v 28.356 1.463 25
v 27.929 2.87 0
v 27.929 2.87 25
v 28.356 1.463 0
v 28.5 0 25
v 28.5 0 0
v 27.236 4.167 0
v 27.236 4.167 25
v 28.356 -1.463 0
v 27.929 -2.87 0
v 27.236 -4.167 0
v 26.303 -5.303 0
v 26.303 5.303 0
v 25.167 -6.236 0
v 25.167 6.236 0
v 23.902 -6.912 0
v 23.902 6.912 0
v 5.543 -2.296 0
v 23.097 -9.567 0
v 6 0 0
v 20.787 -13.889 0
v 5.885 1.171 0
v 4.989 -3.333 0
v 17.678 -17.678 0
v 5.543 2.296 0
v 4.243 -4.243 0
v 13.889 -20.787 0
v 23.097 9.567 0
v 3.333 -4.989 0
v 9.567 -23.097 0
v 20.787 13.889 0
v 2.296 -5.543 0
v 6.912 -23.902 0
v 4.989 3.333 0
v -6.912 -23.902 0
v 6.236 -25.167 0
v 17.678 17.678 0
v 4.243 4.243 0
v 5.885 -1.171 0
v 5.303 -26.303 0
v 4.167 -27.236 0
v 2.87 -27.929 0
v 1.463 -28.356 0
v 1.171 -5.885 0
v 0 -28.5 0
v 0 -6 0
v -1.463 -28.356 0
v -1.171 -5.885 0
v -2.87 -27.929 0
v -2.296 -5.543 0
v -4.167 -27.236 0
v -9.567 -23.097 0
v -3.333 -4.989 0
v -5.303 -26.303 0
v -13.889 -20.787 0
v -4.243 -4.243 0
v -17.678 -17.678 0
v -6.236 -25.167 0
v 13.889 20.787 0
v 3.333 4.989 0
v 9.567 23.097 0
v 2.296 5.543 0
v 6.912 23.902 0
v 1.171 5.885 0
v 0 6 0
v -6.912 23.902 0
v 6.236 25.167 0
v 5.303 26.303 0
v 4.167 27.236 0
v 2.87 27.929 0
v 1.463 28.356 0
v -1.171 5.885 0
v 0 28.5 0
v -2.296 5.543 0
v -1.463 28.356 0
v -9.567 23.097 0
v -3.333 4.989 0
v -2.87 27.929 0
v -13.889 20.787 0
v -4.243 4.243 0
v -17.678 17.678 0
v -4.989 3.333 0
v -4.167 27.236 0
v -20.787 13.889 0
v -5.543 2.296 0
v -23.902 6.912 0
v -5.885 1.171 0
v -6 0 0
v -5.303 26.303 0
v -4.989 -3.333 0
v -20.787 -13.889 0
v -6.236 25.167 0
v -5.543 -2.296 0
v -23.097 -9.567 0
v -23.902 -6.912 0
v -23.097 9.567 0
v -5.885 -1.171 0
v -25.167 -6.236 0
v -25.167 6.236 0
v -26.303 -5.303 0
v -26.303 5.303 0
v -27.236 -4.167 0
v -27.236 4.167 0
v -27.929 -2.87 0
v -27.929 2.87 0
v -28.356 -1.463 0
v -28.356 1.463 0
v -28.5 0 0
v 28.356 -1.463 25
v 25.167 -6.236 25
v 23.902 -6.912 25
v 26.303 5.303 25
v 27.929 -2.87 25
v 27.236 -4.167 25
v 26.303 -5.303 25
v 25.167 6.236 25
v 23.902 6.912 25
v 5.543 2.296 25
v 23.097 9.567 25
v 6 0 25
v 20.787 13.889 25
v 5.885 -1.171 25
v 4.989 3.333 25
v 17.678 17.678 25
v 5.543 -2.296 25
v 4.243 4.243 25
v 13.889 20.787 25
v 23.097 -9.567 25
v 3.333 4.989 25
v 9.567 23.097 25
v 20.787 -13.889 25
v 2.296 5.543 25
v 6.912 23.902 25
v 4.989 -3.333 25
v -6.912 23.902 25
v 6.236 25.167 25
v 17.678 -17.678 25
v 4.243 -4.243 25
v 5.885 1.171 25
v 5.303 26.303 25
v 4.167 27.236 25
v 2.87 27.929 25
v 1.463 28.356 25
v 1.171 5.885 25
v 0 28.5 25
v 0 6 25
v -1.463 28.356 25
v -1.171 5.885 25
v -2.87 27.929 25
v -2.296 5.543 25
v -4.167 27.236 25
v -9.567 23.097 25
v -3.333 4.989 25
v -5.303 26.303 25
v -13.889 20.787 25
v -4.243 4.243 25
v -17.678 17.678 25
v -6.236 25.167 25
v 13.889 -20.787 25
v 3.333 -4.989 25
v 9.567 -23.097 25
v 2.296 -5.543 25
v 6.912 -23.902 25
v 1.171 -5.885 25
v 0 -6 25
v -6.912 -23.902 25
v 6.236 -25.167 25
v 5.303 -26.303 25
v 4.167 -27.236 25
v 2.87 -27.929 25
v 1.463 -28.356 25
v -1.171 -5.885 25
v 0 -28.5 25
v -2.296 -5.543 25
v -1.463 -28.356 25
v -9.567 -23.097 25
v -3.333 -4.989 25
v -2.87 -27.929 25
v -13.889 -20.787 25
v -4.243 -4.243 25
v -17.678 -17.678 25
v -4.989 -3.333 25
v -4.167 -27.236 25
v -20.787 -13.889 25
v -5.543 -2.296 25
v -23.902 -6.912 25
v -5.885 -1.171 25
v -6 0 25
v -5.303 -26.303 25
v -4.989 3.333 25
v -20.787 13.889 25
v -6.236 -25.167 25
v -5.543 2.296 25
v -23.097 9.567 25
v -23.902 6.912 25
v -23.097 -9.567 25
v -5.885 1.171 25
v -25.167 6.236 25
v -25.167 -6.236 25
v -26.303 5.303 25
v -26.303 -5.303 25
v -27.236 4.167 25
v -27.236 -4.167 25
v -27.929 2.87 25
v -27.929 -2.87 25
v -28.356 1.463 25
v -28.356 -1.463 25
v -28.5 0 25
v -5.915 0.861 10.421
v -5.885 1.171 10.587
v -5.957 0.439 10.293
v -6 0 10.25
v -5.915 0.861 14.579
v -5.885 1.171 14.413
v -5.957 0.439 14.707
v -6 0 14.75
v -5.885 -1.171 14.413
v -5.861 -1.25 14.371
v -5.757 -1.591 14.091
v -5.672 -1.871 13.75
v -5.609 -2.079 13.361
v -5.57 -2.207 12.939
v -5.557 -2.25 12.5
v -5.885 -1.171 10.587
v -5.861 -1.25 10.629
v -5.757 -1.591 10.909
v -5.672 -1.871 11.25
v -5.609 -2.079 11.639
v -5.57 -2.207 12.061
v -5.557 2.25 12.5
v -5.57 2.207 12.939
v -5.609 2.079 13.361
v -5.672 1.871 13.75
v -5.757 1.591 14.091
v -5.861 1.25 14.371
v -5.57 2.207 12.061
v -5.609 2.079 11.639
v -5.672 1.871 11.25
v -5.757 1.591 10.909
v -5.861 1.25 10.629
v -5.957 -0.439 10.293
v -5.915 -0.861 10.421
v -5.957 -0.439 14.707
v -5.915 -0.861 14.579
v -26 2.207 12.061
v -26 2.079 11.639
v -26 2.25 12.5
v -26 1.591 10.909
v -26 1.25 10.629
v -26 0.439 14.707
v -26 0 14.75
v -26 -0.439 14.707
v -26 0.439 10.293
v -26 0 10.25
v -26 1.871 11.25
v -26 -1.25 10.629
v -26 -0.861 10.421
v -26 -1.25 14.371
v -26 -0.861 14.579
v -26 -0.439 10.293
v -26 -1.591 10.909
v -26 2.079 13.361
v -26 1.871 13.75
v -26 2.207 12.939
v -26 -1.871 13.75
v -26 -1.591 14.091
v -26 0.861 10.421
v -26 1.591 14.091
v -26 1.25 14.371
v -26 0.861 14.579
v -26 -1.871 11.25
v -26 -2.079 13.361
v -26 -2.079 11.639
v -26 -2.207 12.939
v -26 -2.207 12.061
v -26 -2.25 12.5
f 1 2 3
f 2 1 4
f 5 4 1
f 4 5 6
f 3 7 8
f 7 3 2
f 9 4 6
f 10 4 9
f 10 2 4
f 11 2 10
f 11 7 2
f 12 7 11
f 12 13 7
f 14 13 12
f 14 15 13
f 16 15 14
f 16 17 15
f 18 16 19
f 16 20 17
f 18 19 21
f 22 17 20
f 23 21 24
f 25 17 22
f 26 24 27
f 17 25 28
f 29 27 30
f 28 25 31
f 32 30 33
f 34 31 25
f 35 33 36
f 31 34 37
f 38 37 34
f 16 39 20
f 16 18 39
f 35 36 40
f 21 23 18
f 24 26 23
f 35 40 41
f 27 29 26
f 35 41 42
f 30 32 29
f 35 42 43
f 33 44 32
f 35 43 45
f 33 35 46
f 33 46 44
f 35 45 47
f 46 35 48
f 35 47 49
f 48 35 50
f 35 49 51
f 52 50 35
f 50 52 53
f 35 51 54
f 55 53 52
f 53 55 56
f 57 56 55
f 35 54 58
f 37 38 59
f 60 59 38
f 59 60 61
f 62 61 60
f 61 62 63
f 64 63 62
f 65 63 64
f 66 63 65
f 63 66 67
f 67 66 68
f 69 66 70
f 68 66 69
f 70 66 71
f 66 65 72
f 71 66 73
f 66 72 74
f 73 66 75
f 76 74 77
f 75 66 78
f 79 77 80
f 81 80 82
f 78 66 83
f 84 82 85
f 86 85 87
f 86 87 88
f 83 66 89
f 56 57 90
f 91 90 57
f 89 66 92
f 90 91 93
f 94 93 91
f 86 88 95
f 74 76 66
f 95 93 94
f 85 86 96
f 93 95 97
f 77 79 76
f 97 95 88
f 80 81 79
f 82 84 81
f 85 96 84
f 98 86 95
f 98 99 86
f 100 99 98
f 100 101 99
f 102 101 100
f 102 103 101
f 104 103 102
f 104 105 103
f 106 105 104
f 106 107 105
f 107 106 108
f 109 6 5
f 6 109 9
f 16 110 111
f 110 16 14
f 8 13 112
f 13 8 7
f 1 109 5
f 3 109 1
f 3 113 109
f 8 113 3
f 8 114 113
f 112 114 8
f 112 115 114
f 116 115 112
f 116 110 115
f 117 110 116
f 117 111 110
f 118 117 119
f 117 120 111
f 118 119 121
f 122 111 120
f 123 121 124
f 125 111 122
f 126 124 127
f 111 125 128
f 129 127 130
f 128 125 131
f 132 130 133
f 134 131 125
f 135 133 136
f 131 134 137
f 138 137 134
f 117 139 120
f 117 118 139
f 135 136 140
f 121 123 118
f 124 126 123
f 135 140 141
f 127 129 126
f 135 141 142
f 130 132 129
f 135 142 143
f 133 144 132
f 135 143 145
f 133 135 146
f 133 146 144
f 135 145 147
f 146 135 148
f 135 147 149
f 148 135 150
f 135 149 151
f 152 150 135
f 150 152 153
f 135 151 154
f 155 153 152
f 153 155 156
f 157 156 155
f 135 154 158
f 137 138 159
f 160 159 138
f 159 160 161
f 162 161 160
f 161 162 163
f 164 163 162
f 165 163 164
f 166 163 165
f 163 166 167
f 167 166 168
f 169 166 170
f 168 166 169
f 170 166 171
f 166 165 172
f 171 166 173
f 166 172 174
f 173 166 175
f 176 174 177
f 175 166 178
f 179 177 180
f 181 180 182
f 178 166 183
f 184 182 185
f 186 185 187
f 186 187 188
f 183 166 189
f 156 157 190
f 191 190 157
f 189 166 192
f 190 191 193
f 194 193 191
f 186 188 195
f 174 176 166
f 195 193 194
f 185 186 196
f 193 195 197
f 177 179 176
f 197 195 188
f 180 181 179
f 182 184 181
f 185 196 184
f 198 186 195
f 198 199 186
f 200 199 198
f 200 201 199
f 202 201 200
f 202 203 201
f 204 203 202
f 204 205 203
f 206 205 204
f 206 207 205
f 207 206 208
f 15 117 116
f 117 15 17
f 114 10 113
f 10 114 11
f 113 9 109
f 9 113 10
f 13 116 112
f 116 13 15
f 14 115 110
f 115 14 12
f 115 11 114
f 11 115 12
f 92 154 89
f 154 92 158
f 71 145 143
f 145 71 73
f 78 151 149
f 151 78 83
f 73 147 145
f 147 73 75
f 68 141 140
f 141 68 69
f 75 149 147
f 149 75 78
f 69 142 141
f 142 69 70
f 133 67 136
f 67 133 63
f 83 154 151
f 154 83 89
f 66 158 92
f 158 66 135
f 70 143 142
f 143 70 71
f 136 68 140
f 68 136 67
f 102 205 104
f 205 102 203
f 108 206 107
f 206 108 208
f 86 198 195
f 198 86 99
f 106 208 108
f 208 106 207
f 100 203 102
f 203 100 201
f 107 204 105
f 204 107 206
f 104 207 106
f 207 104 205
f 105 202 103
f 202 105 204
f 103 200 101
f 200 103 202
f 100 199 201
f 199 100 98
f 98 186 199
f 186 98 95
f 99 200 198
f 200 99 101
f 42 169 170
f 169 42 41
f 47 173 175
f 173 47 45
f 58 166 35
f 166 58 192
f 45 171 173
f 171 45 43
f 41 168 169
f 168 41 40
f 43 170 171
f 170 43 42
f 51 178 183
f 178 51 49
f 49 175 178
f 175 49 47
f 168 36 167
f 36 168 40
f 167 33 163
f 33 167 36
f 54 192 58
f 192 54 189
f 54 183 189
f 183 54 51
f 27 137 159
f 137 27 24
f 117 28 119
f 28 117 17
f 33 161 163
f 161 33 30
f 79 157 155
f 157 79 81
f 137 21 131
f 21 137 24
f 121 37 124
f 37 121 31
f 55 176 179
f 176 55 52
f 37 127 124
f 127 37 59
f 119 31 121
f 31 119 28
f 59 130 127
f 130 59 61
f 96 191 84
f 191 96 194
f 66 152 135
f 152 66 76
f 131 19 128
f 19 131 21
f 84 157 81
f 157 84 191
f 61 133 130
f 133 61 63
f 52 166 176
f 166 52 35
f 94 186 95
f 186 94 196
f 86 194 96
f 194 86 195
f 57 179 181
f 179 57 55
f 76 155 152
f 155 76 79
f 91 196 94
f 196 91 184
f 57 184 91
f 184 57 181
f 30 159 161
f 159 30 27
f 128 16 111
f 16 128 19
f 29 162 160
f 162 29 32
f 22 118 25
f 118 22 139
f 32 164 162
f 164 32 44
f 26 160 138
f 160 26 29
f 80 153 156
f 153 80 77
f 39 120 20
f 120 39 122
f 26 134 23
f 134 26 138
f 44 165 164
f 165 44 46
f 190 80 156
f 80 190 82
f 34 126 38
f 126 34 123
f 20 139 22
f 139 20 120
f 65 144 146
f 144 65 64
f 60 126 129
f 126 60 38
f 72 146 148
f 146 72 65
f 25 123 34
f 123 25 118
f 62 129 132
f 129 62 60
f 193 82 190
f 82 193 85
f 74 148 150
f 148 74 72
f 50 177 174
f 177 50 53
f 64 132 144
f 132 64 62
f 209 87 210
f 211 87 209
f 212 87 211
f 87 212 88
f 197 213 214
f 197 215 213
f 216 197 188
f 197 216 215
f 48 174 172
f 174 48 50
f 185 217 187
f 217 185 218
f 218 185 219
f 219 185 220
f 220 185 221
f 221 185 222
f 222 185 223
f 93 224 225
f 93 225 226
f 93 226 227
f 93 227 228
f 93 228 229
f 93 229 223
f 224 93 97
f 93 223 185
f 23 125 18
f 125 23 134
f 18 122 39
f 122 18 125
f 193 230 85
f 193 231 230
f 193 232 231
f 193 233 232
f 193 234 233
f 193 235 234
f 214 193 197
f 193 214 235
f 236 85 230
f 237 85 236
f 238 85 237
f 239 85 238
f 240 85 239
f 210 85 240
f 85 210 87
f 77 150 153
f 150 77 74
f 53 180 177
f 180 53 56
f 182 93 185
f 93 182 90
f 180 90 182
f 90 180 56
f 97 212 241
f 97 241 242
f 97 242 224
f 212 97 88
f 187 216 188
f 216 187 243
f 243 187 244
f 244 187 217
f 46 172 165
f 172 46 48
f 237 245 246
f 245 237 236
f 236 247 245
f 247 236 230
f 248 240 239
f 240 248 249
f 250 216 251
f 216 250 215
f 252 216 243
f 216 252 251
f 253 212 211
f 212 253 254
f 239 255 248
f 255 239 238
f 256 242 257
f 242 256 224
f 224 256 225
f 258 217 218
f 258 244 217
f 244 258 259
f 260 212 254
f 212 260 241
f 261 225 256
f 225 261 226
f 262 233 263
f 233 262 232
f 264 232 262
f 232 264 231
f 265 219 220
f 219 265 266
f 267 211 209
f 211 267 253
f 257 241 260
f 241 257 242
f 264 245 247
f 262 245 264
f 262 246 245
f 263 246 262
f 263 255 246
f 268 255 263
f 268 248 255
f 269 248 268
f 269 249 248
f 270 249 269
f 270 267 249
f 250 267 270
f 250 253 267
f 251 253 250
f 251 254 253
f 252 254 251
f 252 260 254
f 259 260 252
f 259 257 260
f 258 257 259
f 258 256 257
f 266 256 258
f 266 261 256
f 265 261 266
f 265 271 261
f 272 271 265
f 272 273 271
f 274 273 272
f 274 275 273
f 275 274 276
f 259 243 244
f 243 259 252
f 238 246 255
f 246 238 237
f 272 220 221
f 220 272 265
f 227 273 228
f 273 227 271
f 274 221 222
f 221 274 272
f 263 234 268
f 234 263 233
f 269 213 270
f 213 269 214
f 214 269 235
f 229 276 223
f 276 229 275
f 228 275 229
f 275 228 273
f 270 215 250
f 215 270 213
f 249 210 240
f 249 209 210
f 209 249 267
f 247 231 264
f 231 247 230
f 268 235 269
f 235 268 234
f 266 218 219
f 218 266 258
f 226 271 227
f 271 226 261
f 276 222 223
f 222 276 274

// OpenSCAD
$fn = 32;

// ----------------------------------------------------------------------
// Hand knob: 50 x 50 x 25 mm
// ----------------------------------------------------------------------

// --- parameters (mm) ---
grip_d = 50;              // knob diameter
grip_h = 25;              // knob height
shaft_d = 12;             // shaft bore
set_d = 4.5;              // set screw tap hole
knurl_dia = 1;            // knurl groove diameter
lobes = 4;                // grip lobes

module body() {
  cylinder(h = grip_h, d = grip_d);
  for (i = [0 : lobes - 1])
    rotate([0, 0, i * 360 / lobes])
      translate([grip_d * 0.42, 0, 0])
        cylinder(h = grip_h, d = grip_d * 0.3);
}

difference() {
  union() {
    body();
  }
  translate([0, 0, -1]) cylinder(h = grip_h + 0 + 2, d = shaft_d);
  translate([-grip_d / 2 - 1, 0, grip_h * 0.5]) rotate([0, 90, 0]) cylinder(h = grip_d / 2 + 2, d = set_d);
}
